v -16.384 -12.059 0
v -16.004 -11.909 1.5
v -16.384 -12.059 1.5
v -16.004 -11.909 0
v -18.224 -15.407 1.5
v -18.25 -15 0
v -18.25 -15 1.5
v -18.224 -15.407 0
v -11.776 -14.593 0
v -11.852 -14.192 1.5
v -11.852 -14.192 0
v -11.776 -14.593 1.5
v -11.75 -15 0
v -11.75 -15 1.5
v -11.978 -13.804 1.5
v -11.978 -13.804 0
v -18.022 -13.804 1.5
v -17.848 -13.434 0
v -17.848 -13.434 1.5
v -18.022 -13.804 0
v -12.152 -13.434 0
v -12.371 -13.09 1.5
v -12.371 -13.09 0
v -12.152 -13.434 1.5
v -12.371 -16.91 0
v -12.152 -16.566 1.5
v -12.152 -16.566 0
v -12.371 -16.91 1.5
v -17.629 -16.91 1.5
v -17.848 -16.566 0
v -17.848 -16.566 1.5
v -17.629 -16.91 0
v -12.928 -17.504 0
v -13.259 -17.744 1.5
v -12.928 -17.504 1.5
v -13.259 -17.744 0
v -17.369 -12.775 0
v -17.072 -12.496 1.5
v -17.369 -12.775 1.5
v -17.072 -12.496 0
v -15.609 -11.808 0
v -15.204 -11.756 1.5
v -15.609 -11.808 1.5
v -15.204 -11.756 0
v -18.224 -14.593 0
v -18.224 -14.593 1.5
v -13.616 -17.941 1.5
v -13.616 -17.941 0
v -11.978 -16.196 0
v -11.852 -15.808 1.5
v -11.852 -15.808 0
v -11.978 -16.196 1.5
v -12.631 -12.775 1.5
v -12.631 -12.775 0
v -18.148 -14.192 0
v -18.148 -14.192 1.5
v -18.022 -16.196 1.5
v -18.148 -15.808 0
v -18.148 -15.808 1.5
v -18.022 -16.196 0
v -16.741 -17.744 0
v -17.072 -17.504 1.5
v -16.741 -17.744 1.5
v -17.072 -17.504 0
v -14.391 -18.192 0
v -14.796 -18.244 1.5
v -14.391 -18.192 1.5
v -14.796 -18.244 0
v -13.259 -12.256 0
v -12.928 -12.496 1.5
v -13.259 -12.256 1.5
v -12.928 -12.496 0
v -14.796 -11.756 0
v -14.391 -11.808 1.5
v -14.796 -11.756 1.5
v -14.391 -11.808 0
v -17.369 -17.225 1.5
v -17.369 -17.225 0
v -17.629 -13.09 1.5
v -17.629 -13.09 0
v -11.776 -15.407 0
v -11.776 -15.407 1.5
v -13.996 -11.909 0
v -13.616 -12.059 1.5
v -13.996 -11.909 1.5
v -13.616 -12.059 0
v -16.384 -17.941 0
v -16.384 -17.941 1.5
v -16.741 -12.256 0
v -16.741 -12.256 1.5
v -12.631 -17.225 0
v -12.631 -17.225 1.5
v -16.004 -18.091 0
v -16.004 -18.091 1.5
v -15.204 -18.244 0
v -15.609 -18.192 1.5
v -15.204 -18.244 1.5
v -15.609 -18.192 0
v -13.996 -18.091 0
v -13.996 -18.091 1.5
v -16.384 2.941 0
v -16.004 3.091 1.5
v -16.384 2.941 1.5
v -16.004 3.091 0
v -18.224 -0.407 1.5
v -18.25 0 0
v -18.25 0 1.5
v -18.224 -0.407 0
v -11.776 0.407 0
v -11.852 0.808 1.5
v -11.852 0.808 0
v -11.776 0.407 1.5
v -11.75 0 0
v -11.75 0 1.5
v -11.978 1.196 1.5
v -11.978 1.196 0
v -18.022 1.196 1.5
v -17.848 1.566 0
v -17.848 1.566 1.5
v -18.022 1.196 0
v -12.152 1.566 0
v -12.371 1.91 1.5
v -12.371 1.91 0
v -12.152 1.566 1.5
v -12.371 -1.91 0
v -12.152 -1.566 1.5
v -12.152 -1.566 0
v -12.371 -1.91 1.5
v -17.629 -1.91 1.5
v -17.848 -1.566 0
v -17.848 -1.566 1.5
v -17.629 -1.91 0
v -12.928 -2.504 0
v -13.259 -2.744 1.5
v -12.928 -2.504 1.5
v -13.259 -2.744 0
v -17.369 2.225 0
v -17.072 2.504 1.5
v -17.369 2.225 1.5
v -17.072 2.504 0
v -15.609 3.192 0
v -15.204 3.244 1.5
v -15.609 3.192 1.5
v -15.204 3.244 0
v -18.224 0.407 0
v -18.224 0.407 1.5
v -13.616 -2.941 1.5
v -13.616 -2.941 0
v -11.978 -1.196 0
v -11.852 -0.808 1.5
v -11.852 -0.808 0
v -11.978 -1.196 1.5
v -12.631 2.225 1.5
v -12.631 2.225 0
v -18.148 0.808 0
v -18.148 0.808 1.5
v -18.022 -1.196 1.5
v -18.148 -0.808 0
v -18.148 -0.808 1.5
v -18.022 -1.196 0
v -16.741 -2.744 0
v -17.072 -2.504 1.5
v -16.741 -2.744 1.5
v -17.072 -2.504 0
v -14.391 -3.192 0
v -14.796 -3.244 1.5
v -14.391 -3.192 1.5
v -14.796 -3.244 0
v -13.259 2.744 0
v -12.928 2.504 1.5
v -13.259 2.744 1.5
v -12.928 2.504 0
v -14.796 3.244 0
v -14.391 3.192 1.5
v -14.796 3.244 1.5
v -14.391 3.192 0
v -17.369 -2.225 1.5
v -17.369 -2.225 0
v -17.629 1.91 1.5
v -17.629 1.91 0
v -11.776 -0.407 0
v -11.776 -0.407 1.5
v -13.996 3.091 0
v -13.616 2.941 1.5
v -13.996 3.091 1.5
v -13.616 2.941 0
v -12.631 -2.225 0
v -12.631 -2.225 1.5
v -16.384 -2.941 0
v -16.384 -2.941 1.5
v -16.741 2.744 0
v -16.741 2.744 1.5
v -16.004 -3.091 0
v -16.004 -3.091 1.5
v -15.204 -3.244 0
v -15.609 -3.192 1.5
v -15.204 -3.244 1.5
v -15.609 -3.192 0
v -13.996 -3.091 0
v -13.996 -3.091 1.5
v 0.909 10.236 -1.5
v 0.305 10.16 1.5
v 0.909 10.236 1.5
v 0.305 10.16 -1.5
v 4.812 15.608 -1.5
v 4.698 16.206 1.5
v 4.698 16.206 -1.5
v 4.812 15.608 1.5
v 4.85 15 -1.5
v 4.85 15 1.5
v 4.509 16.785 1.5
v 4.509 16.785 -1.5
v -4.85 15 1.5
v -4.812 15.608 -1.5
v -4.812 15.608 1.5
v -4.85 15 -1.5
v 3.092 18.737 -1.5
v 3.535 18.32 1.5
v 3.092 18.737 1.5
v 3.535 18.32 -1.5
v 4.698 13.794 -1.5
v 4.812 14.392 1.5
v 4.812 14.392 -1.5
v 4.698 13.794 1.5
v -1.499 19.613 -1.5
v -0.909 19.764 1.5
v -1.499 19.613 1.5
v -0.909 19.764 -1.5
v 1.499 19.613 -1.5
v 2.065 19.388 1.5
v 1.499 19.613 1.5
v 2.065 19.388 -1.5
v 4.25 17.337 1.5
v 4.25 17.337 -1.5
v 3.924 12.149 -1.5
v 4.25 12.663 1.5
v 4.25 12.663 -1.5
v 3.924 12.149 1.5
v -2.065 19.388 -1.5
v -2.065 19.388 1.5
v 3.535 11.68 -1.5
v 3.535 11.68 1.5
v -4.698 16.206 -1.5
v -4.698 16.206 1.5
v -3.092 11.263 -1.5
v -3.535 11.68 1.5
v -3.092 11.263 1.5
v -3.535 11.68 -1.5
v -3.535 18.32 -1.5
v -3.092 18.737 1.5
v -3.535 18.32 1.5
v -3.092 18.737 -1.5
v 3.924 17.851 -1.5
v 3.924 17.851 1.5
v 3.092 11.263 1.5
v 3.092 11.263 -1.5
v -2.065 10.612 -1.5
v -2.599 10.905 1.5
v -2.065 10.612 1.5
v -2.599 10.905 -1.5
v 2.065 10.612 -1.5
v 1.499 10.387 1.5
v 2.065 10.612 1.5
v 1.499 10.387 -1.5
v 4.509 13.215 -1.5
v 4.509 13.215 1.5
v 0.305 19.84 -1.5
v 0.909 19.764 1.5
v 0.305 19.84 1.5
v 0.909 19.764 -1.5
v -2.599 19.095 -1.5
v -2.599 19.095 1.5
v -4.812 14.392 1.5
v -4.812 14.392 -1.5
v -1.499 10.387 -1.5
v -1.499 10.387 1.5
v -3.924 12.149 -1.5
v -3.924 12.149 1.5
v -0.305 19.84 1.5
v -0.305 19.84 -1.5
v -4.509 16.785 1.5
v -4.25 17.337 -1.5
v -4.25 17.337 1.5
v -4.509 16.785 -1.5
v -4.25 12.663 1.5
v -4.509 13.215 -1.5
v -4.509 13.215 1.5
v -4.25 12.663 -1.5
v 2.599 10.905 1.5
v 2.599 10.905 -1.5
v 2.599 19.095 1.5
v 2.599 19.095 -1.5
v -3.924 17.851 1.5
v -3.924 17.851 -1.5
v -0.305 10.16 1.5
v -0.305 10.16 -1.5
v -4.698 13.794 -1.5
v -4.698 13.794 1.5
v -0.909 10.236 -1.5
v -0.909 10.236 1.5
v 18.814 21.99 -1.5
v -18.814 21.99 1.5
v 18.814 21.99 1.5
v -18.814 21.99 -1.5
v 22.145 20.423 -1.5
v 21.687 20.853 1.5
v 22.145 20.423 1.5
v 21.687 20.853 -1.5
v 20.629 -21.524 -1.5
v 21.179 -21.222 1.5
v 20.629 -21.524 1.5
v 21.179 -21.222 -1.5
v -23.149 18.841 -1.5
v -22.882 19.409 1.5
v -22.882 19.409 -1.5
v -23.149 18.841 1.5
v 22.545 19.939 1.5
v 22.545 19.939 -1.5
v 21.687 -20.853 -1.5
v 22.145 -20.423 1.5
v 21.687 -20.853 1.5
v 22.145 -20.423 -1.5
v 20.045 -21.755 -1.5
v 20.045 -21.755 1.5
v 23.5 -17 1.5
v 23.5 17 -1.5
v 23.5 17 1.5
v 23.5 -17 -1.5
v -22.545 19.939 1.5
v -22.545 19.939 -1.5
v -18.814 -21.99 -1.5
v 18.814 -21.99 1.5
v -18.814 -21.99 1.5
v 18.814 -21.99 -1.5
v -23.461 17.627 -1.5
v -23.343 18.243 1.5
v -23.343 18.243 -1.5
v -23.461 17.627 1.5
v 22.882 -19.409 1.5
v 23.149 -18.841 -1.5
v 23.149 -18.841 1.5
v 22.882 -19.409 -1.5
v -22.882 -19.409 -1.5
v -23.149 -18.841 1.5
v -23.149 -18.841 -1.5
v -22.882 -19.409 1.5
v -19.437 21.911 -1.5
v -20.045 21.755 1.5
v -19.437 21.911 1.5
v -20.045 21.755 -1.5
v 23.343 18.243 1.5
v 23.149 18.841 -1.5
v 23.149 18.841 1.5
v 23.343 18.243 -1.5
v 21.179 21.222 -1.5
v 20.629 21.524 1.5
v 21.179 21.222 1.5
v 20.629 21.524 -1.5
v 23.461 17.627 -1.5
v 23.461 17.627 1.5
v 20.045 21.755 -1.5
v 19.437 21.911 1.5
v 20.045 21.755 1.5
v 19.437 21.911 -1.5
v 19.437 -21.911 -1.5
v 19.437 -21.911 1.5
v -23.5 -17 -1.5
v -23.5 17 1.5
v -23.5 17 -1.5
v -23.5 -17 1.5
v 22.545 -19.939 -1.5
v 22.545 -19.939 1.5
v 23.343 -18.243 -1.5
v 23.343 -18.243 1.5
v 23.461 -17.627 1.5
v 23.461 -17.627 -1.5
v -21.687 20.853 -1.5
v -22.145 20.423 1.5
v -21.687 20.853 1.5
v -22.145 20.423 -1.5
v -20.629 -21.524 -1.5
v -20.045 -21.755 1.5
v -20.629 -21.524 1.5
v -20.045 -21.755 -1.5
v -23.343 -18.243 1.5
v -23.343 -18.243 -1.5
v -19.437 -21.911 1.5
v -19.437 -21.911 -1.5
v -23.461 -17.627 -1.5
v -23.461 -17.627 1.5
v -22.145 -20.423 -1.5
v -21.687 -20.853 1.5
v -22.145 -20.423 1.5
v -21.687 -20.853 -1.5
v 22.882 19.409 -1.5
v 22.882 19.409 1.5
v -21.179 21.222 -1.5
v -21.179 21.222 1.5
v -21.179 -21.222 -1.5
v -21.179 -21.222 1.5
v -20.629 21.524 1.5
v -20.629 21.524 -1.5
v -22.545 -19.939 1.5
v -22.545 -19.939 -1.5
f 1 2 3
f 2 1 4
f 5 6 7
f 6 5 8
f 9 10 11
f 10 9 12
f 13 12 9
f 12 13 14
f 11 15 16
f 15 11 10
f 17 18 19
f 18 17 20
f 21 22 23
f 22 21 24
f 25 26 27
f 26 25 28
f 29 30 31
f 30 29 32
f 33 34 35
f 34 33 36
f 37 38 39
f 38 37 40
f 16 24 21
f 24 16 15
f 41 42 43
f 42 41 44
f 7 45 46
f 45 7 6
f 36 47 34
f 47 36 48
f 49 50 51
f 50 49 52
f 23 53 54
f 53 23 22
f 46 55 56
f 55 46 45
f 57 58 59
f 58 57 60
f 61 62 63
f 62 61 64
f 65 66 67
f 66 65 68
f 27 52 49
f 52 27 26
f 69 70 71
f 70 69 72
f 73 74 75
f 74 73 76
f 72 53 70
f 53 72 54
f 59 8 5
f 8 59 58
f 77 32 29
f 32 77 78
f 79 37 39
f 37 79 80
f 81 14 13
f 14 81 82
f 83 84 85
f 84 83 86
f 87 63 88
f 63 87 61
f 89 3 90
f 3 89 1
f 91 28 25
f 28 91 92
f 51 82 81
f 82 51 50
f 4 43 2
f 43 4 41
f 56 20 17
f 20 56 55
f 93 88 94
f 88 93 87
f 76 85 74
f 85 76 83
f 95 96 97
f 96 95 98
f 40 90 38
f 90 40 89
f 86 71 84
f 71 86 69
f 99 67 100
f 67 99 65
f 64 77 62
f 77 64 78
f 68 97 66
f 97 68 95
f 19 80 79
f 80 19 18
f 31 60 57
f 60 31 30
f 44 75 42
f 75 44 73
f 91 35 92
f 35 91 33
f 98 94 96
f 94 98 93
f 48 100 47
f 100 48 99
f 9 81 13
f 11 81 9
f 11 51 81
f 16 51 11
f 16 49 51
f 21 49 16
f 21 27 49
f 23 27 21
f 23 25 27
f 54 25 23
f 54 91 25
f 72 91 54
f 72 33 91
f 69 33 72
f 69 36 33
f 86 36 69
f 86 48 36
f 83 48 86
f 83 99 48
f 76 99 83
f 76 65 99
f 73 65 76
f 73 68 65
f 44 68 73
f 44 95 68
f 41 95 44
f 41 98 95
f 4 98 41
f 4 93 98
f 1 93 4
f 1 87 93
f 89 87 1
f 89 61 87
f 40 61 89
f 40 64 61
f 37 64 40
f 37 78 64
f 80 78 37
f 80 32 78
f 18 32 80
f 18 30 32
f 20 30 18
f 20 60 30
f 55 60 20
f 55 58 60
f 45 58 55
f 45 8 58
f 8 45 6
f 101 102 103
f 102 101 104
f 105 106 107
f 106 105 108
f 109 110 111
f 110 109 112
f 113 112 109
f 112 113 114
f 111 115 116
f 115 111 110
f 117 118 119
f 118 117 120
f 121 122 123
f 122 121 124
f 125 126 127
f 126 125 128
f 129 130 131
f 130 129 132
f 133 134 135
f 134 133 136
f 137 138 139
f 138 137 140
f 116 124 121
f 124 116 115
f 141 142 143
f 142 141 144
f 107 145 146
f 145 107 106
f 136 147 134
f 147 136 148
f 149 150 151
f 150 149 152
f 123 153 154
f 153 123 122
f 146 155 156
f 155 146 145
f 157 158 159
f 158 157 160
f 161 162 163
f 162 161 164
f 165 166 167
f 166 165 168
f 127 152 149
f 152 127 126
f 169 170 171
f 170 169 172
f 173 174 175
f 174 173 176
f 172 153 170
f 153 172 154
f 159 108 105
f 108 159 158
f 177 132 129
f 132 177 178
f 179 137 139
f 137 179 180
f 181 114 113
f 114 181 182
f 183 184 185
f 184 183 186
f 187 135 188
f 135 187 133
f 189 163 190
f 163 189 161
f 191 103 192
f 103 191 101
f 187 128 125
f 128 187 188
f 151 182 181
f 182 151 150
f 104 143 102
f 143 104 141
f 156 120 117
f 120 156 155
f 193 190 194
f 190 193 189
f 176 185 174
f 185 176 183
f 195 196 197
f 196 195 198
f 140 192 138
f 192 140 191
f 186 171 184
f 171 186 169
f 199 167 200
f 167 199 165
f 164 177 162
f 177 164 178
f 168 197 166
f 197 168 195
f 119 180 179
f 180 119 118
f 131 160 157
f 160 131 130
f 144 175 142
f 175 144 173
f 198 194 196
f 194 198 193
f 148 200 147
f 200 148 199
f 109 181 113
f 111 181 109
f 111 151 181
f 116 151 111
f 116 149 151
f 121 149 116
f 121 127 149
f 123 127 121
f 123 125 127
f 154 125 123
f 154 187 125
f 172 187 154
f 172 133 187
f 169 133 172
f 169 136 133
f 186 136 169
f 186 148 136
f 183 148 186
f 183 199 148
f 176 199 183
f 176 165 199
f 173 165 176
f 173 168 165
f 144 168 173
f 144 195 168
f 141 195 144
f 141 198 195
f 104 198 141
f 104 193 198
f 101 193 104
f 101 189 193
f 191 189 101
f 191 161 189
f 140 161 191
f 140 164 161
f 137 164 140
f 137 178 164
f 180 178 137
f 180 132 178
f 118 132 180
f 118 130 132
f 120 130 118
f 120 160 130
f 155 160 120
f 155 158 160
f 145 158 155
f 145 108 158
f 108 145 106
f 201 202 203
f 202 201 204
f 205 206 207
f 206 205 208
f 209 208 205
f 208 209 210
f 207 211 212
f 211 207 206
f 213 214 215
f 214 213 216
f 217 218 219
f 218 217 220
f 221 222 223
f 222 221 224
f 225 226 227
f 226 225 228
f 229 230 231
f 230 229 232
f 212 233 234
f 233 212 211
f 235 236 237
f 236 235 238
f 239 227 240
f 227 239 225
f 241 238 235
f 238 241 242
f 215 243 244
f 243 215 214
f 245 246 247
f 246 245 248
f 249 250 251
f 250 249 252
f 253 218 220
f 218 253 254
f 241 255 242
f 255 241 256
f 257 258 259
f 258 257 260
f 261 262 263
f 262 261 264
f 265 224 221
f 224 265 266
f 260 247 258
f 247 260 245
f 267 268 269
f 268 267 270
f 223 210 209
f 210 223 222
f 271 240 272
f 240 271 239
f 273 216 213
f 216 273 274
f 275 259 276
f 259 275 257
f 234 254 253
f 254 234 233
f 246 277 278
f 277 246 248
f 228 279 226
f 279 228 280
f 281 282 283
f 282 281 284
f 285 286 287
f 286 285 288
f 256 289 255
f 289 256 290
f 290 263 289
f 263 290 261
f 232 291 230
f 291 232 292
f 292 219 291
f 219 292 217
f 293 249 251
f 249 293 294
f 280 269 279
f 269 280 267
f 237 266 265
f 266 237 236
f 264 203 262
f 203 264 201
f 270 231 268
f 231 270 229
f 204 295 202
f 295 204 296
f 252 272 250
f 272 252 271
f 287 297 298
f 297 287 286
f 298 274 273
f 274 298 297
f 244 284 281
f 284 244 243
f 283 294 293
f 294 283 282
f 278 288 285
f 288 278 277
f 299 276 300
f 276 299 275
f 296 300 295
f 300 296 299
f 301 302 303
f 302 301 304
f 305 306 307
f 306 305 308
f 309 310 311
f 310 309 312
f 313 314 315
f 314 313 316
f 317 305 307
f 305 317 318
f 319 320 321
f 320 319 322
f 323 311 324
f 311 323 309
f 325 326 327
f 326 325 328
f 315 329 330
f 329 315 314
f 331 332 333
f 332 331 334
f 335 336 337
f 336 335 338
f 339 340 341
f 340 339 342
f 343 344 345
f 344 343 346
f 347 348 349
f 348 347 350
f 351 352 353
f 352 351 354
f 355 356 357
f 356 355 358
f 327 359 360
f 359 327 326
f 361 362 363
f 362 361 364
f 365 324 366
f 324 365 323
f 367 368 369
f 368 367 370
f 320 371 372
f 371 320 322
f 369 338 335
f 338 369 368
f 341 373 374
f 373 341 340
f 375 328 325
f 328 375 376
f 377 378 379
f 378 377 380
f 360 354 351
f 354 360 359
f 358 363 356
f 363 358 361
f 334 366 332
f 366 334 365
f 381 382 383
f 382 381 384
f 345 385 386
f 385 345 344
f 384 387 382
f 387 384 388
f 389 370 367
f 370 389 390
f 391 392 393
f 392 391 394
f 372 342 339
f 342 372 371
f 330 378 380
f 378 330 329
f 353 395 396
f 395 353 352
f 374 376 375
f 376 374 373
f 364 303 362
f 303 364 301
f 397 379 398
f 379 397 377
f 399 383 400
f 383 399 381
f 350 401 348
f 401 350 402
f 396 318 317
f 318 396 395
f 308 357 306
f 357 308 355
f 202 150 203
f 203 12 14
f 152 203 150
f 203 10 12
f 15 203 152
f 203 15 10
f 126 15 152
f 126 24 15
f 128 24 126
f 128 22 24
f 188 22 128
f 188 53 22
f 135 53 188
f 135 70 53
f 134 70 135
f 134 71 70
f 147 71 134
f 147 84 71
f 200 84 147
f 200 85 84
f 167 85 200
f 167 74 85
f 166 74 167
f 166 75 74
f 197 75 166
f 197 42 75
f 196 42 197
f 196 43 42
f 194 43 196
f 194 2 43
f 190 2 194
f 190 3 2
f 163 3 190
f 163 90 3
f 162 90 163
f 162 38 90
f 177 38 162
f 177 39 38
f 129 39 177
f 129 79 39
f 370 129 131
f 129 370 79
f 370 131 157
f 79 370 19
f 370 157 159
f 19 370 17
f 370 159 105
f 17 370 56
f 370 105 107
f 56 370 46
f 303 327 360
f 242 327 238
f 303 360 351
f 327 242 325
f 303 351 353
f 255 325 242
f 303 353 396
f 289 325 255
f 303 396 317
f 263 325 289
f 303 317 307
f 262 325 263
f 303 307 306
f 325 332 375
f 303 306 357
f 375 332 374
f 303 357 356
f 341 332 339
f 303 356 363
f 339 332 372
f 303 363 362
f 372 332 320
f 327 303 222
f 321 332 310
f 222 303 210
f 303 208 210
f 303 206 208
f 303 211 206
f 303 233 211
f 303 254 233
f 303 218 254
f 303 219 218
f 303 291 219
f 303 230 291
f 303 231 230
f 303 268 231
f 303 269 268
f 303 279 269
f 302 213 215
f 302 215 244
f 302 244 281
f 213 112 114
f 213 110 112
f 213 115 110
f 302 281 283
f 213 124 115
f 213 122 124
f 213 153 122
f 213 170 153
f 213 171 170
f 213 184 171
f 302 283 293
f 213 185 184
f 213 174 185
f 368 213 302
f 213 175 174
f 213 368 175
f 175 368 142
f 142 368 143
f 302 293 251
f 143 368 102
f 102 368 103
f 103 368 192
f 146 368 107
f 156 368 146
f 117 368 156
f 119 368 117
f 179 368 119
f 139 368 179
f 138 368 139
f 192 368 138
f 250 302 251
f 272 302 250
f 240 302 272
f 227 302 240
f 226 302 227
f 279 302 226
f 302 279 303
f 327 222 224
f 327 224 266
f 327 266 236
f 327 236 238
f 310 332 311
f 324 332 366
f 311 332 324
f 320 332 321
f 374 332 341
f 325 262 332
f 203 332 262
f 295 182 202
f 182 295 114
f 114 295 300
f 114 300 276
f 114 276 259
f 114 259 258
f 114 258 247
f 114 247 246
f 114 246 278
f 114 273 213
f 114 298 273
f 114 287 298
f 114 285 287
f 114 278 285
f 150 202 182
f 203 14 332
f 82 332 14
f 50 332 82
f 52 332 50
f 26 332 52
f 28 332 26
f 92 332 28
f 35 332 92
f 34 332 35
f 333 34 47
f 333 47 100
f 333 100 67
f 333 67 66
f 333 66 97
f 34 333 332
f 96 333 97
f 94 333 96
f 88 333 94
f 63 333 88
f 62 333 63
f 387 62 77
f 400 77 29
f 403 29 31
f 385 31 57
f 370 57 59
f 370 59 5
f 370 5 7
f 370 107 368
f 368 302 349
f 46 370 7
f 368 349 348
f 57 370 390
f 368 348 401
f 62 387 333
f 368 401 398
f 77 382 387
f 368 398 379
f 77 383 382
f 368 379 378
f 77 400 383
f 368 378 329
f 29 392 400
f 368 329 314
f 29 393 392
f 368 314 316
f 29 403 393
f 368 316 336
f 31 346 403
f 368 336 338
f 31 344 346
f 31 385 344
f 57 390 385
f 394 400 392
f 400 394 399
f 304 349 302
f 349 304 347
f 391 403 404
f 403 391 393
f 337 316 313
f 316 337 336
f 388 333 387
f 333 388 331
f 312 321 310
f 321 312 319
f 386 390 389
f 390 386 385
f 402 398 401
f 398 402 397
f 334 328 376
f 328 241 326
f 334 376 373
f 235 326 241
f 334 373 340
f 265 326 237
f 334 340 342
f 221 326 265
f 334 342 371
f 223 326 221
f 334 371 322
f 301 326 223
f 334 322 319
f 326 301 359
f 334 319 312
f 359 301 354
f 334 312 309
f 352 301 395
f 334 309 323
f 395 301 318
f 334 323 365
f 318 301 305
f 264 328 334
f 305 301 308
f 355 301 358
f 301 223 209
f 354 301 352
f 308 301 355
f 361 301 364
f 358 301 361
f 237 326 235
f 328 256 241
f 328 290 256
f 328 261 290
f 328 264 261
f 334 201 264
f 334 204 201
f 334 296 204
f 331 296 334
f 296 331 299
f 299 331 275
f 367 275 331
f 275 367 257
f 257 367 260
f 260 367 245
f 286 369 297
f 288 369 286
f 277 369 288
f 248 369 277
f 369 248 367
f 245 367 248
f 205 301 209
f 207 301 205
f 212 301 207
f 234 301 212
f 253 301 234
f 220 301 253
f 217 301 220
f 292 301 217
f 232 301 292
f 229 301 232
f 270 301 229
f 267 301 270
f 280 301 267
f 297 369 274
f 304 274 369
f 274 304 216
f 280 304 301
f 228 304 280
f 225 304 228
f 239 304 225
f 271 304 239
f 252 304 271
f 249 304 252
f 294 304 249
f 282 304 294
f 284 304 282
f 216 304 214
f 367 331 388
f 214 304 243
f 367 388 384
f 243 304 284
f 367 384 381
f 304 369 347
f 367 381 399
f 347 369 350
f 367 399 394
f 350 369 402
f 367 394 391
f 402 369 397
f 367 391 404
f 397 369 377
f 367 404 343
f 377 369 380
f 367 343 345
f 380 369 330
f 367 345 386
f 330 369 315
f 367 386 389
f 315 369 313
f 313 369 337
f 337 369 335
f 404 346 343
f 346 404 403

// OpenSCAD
$fn = 50;


difference() {
	union() {
		translate(v = [0, 0, -1.5000000000]) {
			hull() {
				translate(v = [-18.5000000000, 17.0000000000, 0]) {
					cylinder(h = 3, r = 5);
				}
				translate(v = [18.5000000000, 17.0000000000, 0]) {
					cylinder(h = 3, r = 5);
				}
				translate(v = [-18.5000000000, -17.0000000000, 0]) {
					cylinder(h = 3, r = 5);
				}
				translate(v = [18.5000000000, -17.0000000000, 0]) {
					cylinder(h = 3, r = 5);
				}
			}
		}
	}
	union() {
		translate(v = [-15.0000000000, -15.0000000000, 0]) {
			cylinder(h = 100, r = 3.2500000000);
		}
		translate(v = [-15.0000000000, 0.0000000000, 0]) {
			cylinder(h = 100, r = 3.2500000000);
		}
		translate(v = [0, 15, -100.0000000000]) {
			cylinder(h = 200, r = 4.8500000000);
		}
	}
}
